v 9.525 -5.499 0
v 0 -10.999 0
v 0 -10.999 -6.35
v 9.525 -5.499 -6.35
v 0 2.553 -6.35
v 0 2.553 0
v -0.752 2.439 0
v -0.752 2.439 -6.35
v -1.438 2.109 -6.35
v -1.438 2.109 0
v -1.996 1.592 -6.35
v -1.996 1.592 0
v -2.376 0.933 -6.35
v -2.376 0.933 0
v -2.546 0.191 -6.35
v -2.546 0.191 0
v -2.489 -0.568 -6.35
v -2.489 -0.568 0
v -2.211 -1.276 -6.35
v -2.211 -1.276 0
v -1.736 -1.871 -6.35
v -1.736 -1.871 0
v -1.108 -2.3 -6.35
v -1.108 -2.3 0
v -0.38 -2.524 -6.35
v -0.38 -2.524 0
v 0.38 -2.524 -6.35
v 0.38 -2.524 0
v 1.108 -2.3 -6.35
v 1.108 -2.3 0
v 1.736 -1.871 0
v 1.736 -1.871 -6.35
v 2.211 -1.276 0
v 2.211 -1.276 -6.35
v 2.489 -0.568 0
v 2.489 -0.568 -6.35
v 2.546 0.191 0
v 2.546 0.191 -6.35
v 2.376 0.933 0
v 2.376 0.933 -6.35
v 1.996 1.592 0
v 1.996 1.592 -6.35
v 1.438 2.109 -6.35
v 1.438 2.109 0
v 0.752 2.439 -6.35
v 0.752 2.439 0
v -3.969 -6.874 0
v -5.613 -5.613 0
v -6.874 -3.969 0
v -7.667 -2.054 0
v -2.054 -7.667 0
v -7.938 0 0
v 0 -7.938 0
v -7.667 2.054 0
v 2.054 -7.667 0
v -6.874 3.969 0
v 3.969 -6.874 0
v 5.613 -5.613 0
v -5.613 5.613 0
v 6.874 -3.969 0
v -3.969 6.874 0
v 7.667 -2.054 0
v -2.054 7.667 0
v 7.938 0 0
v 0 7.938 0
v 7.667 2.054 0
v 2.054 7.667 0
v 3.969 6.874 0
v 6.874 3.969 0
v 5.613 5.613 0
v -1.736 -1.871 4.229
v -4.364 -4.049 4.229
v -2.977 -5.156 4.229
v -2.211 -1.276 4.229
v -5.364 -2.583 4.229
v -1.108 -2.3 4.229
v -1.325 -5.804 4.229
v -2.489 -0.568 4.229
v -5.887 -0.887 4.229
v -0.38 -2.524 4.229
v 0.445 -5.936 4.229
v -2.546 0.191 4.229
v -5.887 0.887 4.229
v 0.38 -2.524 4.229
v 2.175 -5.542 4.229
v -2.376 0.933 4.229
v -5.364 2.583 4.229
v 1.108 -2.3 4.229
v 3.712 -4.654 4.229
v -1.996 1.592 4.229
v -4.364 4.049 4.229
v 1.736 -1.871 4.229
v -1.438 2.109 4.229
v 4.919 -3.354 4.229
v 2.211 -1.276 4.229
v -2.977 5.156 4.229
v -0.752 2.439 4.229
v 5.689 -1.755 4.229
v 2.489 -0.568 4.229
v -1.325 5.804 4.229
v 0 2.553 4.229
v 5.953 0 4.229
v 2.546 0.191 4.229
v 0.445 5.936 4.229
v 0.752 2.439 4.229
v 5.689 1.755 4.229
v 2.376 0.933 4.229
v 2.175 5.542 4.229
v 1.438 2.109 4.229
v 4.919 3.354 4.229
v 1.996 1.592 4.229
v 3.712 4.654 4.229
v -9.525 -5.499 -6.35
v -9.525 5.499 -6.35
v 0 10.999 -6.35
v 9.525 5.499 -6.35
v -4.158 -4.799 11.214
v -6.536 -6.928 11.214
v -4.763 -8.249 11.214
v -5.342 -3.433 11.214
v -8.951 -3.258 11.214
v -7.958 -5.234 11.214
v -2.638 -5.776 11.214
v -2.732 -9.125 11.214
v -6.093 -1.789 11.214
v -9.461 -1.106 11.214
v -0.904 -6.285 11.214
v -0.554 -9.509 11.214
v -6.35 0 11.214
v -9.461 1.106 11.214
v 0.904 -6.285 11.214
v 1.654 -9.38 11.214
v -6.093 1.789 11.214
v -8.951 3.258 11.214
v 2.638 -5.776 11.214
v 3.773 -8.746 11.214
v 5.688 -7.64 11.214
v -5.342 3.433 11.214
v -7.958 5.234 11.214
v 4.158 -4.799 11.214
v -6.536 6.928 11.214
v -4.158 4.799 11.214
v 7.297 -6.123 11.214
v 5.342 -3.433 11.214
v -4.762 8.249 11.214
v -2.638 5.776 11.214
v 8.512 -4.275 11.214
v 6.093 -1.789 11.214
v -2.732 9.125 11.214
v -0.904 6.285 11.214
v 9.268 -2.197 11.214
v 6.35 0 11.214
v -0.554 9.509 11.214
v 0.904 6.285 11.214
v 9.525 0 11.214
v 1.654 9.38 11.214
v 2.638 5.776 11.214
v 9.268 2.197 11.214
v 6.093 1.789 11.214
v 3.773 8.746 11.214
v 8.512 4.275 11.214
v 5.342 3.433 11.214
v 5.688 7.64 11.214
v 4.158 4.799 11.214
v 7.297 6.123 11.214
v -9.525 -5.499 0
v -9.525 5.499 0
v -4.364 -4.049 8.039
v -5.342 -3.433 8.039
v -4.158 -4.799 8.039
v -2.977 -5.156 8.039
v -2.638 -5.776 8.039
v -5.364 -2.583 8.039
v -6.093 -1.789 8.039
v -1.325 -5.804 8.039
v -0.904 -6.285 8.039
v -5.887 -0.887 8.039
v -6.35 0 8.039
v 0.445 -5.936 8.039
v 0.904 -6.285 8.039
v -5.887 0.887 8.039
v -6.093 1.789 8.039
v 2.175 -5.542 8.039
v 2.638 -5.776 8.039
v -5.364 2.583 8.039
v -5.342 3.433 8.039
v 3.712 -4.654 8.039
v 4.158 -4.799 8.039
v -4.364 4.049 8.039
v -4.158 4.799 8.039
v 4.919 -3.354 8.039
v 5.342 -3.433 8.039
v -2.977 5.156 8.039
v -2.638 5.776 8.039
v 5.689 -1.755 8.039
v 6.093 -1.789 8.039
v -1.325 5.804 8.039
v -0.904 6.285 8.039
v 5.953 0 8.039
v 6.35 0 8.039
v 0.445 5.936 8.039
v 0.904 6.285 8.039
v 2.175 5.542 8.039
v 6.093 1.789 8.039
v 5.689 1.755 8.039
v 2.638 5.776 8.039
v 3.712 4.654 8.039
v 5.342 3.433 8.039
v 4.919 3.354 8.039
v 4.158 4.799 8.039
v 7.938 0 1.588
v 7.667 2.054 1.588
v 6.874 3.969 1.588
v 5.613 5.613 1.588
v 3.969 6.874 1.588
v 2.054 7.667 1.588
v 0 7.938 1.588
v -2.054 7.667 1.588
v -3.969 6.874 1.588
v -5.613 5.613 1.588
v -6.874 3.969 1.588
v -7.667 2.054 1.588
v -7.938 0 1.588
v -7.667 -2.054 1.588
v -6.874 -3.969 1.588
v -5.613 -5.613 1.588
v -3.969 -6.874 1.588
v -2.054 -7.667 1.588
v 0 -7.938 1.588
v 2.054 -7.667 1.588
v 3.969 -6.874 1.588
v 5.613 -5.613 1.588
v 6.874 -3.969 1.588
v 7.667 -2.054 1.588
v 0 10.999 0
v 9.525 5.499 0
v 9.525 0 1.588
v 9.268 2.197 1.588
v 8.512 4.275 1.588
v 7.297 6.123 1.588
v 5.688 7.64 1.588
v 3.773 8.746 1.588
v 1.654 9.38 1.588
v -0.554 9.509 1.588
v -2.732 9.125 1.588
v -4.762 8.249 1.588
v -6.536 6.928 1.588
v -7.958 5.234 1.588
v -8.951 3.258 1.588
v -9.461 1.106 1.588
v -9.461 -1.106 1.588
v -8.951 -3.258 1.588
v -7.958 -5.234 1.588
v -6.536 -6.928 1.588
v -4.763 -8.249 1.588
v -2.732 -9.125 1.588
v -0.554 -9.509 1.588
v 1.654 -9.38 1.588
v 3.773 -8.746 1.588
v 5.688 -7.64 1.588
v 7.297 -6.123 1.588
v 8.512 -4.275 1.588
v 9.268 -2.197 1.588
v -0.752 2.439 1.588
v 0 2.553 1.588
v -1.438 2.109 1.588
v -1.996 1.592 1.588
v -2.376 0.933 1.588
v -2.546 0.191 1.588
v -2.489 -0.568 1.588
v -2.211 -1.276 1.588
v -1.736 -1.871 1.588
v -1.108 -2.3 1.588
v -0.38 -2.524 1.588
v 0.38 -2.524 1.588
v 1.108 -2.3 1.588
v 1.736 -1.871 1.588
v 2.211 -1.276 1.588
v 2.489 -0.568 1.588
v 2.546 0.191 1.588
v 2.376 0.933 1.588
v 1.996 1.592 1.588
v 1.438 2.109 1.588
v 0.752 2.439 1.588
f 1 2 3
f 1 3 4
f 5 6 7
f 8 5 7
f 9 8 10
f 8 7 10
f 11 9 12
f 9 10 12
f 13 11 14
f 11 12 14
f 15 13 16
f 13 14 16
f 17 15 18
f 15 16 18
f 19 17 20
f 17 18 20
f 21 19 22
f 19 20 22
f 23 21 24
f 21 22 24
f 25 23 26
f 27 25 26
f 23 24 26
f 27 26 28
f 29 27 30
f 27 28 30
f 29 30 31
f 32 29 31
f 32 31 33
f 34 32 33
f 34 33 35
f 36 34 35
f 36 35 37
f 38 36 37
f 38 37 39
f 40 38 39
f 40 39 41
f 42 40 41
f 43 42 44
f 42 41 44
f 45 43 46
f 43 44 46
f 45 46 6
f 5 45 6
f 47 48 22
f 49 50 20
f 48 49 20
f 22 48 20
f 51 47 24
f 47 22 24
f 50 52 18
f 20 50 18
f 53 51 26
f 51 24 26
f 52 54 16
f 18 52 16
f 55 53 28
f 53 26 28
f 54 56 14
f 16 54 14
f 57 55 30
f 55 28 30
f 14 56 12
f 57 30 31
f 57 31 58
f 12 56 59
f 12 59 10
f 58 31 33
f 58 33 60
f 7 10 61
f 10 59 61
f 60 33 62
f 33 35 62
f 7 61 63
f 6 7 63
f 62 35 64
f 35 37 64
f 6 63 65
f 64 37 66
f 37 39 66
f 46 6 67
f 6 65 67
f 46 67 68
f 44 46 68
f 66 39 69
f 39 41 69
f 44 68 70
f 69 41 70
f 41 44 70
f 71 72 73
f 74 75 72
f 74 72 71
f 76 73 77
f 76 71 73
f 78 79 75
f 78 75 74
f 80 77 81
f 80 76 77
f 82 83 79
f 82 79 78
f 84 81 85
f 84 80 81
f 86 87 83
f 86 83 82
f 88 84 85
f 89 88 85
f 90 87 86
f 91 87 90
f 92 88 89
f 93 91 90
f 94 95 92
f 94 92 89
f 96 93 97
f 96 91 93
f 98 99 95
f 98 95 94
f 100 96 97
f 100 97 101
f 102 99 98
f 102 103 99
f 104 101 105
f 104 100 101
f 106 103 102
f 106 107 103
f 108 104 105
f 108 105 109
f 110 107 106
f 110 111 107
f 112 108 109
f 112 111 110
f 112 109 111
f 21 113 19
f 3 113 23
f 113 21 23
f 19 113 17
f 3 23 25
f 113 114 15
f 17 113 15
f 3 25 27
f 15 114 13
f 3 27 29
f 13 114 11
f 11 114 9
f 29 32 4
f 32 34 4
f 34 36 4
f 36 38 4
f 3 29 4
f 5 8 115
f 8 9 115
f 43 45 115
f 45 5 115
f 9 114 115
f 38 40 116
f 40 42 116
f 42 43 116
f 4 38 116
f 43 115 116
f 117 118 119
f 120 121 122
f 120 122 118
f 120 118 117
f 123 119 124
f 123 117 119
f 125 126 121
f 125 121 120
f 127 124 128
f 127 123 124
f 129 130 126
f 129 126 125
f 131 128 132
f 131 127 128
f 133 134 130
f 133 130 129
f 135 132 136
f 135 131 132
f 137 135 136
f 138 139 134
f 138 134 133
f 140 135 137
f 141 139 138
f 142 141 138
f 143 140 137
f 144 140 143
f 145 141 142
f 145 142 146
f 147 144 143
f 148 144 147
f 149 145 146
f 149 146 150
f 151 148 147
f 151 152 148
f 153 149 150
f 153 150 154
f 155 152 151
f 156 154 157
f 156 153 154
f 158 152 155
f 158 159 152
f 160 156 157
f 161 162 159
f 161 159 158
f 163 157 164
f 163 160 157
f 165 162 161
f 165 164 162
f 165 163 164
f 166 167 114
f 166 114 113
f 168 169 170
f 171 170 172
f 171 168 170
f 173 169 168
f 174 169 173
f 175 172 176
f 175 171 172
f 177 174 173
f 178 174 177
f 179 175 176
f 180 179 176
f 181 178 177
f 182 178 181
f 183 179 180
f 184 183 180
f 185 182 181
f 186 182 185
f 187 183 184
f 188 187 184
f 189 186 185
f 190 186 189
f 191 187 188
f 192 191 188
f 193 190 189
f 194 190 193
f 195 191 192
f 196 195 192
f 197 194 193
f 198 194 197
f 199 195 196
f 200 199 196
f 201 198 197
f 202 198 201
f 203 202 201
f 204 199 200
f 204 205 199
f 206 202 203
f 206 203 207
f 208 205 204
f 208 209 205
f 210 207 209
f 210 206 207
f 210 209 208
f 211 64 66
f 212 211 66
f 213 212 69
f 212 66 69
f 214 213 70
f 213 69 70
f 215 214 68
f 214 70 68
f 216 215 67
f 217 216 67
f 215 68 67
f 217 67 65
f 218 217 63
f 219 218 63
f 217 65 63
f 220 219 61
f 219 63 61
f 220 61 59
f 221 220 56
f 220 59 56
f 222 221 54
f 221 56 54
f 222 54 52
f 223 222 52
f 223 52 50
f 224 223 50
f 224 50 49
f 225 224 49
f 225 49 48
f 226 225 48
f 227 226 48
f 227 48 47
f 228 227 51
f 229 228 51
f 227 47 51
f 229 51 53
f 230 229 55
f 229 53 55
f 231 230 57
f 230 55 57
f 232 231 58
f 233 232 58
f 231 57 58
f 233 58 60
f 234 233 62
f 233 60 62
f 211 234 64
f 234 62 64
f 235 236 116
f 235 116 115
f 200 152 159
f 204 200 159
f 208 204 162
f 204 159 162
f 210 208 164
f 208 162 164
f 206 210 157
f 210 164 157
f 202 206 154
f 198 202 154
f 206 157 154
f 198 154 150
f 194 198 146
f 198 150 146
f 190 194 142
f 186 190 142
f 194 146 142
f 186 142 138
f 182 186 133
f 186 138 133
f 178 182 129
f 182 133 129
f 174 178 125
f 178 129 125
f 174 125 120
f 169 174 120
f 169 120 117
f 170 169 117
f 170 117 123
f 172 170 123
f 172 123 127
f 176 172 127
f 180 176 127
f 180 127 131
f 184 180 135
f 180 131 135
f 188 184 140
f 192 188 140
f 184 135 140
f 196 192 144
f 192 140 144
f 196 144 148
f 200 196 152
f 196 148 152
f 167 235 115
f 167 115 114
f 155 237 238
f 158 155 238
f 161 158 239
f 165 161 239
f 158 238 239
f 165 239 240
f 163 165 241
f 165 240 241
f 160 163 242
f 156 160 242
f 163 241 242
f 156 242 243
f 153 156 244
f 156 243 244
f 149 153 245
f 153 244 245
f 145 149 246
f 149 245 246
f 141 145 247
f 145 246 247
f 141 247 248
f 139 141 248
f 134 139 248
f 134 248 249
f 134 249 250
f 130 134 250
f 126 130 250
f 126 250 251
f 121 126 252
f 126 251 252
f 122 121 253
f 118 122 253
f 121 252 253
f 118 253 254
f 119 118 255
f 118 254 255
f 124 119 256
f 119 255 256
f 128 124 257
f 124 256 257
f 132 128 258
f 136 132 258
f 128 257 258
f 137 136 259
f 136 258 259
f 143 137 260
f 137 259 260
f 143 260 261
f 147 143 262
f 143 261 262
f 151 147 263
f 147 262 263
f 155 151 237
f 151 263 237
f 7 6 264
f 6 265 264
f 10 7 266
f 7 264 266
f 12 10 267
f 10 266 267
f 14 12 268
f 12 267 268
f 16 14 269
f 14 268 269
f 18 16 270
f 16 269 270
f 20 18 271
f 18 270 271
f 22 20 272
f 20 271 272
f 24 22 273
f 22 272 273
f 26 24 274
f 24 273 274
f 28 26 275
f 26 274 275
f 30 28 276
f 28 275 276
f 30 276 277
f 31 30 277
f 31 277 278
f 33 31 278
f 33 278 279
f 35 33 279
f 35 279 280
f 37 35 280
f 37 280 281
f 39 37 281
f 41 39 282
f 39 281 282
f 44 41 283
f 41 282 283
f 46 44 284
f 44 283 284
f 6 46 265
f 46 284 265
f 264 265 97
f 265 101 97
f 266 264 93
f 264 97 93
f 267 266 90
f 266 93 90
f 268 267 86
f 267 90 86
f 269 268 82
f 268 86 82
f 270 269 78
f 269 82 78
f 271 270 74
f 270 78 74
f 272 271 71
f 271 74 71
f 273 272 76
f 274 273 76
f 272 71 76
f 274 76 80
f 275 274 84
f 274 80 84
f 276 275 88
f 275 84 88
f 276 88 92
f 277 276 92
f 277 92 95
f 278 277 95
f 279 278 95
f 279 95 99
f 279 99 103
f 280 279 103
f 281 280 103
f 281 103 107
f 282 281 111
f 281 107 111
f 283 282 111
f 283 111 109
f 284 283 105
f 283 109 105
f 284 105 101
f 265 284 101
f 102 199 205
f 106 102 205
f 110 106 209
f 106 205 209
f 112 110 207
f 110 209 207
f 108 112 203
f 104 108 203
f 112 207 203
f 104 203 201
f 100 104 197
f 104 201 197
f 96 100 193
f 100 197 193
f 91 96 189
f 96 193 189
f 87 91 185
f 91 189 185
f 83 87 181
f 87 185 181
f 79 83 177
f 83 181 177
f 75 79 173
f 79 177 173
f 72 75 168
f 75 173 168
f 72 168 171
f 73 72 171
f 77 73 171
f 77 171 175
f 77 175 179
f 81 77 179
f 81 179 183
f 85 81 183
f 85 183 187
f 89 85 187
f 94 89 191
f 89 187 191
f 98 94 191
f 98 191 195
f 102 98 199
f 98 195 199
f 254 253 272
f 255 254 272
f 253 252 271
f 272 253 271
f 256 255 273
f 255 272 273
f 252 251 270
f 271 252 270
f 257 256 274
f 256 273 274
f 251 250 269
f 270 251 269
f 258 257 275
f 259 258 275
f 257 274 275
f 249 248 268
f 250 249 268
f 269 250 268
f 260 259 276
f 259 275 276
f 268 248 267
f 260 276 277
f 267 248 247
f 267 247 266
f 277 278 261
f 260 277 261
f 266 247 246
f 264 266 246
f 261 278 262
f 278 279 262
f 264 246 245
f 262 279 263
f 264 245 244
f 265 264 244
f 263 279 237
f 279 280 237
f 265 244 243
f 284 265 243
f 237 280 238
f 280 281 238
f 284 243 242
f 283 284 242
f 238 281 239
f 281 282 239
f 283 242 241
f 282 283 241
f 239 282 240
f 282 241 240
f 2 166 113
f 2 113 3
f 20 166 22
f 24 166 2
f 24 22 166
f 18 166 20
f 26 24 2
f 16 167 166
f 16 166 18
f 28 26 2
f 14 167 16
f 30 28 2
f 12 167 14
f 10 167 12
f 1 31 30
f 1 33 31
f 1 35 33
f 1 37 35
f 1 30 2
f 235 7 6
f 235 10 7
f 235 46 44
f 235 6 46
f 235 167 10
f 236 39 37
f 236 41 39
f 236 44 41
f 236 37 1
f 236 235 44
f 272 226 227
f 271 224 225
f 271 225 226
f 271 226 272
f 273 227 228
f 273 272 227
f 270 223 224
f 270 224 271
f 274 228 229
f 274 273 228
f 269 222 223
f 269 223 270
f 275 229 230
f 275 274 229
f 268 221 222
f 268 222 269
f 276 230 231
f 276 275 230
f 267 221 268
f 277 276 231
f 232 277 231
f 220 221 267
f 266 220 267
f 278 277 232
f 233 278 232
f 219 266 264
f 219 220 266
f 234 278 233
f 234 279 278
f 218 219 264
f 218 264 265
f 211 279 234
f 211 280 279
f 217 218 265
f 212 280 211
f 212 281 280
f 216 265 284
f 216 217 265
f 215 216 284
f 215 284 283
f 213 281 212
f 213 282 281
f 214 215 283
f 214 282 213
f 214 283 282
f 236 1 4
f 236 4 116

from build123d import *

# Parameters (mm, degrees)
BOSS_EXTRUDE1_DEPTH = 6.35
SKETCH2_R           = 7.9375
BOSS_EXTRUDE3_DEPTH = 1.5875
SKETCH7_R           = 9.525
BOSS_EXTRUDE4_DEPTH = 9.6266
SKETCH10_W          = 2.5527
SKETCH10_H          = 17.5641
SKETCH12_R          = 6.35
CUT_EXTRUDE5_DEPTH  = 3.175
SKETCH13_R          = 5.953125
CUT_EXTRUDE6_DEPTH  = 3.81


with BuildPart() as part:
    # Sketch1 → Boss-Extrude1 (new body)
    with BuildSketch(Plane.XY):
        Polygon((0, -10.998522628), (9.525, -5.499261314), (9.525, 5.499261314), (0, 10.998522628), (-9.525, 5.499261314), (-9.525, -5.499261314), align=None)
    extrude(amount=-BOSS_EXTRUDE1_DEPTH)


with BuildPart() as body_2:
    # Sketch2 → Boss-Extrude3 (new body)
    with BuildSketch(Plane.XY):
        Circle(SKETCH2_R)
    extrude(amount=BOSS_EXTRUDE3_DEPTH)


with BuildPart() as body_3:
    # Sketch7 → Boss-Extrude4 (new body)
    with BuildSketch(Plane.XY.offset(1.5875)):
        Circle(SKETCH7_R)
    extrude(amount=BOSS_EXTRUDE4_DEPTH)


with BuildPart() as f_1_4_20_tapped_hole1_tool:
    # Sketch10 → 1/4-20 Tapped Hole1 (revolve)
    with BuildSketch(Plane(origin=(0, 0, -6.35), x_dir=(0, 1, 0), z_dir=(1, 0, 0))):
        with Locations((1.27635, 8.78205)):
            Rectangle(SKETCH10_W, SKETCH10_H)
    revolve(axis=Axis((0, 0, -12.7), (0, 0, 1)))


with BuildPart() as part_1:
    add(part.part)

    # 1/4-20 Tapped Hole1: cut by f_1_4_20_tapped_hole1_tool
    add(f_1_4_20_tapped_hole1_tool.part, mode=Mode.SUBTRACT)


with BuildPart() as body_2_1:
    add(body_2.part)

    # 1/4-20 Tapped Hole1: cut by f_1_4_20_tapped_hole1_tool
    add(f_1_4_20_tapped_hole1_tool.part, mode=Mode.SUBTRACT)


with BuildPart() as body_3_1:
    add(body_3.part)

    # 1/4-20 Tapped Hole1: cut by f_1_4_20_tapped_hole1_tool
    add(f_1_4_20_tapped_hole1_tool.part, mode=Mode.SUBTRACT)

    # Sketch12 → Cut-Extrude5 (cut)
    with BuildSketch(Plane.XY.offset(11.2141)):
        Circle(SKETCH12_R)
    extrude(amount=-CUT_EXTRUDE5_DEPTH, mode=Mode.SUBTRACT)

    # Sketch13 → Cut-Extrude6 (cut)
    with BuildSketch(Plane.XY.offset(8.0391)):
        Circle(SKETCH13_R)
    extrude(amount=-CUT_EXTRUDE6_DEPTH, mode=Mode.SUBTRACT)


solid = Compound([part_1.part, body_2_1.part, body_3_1.part])
